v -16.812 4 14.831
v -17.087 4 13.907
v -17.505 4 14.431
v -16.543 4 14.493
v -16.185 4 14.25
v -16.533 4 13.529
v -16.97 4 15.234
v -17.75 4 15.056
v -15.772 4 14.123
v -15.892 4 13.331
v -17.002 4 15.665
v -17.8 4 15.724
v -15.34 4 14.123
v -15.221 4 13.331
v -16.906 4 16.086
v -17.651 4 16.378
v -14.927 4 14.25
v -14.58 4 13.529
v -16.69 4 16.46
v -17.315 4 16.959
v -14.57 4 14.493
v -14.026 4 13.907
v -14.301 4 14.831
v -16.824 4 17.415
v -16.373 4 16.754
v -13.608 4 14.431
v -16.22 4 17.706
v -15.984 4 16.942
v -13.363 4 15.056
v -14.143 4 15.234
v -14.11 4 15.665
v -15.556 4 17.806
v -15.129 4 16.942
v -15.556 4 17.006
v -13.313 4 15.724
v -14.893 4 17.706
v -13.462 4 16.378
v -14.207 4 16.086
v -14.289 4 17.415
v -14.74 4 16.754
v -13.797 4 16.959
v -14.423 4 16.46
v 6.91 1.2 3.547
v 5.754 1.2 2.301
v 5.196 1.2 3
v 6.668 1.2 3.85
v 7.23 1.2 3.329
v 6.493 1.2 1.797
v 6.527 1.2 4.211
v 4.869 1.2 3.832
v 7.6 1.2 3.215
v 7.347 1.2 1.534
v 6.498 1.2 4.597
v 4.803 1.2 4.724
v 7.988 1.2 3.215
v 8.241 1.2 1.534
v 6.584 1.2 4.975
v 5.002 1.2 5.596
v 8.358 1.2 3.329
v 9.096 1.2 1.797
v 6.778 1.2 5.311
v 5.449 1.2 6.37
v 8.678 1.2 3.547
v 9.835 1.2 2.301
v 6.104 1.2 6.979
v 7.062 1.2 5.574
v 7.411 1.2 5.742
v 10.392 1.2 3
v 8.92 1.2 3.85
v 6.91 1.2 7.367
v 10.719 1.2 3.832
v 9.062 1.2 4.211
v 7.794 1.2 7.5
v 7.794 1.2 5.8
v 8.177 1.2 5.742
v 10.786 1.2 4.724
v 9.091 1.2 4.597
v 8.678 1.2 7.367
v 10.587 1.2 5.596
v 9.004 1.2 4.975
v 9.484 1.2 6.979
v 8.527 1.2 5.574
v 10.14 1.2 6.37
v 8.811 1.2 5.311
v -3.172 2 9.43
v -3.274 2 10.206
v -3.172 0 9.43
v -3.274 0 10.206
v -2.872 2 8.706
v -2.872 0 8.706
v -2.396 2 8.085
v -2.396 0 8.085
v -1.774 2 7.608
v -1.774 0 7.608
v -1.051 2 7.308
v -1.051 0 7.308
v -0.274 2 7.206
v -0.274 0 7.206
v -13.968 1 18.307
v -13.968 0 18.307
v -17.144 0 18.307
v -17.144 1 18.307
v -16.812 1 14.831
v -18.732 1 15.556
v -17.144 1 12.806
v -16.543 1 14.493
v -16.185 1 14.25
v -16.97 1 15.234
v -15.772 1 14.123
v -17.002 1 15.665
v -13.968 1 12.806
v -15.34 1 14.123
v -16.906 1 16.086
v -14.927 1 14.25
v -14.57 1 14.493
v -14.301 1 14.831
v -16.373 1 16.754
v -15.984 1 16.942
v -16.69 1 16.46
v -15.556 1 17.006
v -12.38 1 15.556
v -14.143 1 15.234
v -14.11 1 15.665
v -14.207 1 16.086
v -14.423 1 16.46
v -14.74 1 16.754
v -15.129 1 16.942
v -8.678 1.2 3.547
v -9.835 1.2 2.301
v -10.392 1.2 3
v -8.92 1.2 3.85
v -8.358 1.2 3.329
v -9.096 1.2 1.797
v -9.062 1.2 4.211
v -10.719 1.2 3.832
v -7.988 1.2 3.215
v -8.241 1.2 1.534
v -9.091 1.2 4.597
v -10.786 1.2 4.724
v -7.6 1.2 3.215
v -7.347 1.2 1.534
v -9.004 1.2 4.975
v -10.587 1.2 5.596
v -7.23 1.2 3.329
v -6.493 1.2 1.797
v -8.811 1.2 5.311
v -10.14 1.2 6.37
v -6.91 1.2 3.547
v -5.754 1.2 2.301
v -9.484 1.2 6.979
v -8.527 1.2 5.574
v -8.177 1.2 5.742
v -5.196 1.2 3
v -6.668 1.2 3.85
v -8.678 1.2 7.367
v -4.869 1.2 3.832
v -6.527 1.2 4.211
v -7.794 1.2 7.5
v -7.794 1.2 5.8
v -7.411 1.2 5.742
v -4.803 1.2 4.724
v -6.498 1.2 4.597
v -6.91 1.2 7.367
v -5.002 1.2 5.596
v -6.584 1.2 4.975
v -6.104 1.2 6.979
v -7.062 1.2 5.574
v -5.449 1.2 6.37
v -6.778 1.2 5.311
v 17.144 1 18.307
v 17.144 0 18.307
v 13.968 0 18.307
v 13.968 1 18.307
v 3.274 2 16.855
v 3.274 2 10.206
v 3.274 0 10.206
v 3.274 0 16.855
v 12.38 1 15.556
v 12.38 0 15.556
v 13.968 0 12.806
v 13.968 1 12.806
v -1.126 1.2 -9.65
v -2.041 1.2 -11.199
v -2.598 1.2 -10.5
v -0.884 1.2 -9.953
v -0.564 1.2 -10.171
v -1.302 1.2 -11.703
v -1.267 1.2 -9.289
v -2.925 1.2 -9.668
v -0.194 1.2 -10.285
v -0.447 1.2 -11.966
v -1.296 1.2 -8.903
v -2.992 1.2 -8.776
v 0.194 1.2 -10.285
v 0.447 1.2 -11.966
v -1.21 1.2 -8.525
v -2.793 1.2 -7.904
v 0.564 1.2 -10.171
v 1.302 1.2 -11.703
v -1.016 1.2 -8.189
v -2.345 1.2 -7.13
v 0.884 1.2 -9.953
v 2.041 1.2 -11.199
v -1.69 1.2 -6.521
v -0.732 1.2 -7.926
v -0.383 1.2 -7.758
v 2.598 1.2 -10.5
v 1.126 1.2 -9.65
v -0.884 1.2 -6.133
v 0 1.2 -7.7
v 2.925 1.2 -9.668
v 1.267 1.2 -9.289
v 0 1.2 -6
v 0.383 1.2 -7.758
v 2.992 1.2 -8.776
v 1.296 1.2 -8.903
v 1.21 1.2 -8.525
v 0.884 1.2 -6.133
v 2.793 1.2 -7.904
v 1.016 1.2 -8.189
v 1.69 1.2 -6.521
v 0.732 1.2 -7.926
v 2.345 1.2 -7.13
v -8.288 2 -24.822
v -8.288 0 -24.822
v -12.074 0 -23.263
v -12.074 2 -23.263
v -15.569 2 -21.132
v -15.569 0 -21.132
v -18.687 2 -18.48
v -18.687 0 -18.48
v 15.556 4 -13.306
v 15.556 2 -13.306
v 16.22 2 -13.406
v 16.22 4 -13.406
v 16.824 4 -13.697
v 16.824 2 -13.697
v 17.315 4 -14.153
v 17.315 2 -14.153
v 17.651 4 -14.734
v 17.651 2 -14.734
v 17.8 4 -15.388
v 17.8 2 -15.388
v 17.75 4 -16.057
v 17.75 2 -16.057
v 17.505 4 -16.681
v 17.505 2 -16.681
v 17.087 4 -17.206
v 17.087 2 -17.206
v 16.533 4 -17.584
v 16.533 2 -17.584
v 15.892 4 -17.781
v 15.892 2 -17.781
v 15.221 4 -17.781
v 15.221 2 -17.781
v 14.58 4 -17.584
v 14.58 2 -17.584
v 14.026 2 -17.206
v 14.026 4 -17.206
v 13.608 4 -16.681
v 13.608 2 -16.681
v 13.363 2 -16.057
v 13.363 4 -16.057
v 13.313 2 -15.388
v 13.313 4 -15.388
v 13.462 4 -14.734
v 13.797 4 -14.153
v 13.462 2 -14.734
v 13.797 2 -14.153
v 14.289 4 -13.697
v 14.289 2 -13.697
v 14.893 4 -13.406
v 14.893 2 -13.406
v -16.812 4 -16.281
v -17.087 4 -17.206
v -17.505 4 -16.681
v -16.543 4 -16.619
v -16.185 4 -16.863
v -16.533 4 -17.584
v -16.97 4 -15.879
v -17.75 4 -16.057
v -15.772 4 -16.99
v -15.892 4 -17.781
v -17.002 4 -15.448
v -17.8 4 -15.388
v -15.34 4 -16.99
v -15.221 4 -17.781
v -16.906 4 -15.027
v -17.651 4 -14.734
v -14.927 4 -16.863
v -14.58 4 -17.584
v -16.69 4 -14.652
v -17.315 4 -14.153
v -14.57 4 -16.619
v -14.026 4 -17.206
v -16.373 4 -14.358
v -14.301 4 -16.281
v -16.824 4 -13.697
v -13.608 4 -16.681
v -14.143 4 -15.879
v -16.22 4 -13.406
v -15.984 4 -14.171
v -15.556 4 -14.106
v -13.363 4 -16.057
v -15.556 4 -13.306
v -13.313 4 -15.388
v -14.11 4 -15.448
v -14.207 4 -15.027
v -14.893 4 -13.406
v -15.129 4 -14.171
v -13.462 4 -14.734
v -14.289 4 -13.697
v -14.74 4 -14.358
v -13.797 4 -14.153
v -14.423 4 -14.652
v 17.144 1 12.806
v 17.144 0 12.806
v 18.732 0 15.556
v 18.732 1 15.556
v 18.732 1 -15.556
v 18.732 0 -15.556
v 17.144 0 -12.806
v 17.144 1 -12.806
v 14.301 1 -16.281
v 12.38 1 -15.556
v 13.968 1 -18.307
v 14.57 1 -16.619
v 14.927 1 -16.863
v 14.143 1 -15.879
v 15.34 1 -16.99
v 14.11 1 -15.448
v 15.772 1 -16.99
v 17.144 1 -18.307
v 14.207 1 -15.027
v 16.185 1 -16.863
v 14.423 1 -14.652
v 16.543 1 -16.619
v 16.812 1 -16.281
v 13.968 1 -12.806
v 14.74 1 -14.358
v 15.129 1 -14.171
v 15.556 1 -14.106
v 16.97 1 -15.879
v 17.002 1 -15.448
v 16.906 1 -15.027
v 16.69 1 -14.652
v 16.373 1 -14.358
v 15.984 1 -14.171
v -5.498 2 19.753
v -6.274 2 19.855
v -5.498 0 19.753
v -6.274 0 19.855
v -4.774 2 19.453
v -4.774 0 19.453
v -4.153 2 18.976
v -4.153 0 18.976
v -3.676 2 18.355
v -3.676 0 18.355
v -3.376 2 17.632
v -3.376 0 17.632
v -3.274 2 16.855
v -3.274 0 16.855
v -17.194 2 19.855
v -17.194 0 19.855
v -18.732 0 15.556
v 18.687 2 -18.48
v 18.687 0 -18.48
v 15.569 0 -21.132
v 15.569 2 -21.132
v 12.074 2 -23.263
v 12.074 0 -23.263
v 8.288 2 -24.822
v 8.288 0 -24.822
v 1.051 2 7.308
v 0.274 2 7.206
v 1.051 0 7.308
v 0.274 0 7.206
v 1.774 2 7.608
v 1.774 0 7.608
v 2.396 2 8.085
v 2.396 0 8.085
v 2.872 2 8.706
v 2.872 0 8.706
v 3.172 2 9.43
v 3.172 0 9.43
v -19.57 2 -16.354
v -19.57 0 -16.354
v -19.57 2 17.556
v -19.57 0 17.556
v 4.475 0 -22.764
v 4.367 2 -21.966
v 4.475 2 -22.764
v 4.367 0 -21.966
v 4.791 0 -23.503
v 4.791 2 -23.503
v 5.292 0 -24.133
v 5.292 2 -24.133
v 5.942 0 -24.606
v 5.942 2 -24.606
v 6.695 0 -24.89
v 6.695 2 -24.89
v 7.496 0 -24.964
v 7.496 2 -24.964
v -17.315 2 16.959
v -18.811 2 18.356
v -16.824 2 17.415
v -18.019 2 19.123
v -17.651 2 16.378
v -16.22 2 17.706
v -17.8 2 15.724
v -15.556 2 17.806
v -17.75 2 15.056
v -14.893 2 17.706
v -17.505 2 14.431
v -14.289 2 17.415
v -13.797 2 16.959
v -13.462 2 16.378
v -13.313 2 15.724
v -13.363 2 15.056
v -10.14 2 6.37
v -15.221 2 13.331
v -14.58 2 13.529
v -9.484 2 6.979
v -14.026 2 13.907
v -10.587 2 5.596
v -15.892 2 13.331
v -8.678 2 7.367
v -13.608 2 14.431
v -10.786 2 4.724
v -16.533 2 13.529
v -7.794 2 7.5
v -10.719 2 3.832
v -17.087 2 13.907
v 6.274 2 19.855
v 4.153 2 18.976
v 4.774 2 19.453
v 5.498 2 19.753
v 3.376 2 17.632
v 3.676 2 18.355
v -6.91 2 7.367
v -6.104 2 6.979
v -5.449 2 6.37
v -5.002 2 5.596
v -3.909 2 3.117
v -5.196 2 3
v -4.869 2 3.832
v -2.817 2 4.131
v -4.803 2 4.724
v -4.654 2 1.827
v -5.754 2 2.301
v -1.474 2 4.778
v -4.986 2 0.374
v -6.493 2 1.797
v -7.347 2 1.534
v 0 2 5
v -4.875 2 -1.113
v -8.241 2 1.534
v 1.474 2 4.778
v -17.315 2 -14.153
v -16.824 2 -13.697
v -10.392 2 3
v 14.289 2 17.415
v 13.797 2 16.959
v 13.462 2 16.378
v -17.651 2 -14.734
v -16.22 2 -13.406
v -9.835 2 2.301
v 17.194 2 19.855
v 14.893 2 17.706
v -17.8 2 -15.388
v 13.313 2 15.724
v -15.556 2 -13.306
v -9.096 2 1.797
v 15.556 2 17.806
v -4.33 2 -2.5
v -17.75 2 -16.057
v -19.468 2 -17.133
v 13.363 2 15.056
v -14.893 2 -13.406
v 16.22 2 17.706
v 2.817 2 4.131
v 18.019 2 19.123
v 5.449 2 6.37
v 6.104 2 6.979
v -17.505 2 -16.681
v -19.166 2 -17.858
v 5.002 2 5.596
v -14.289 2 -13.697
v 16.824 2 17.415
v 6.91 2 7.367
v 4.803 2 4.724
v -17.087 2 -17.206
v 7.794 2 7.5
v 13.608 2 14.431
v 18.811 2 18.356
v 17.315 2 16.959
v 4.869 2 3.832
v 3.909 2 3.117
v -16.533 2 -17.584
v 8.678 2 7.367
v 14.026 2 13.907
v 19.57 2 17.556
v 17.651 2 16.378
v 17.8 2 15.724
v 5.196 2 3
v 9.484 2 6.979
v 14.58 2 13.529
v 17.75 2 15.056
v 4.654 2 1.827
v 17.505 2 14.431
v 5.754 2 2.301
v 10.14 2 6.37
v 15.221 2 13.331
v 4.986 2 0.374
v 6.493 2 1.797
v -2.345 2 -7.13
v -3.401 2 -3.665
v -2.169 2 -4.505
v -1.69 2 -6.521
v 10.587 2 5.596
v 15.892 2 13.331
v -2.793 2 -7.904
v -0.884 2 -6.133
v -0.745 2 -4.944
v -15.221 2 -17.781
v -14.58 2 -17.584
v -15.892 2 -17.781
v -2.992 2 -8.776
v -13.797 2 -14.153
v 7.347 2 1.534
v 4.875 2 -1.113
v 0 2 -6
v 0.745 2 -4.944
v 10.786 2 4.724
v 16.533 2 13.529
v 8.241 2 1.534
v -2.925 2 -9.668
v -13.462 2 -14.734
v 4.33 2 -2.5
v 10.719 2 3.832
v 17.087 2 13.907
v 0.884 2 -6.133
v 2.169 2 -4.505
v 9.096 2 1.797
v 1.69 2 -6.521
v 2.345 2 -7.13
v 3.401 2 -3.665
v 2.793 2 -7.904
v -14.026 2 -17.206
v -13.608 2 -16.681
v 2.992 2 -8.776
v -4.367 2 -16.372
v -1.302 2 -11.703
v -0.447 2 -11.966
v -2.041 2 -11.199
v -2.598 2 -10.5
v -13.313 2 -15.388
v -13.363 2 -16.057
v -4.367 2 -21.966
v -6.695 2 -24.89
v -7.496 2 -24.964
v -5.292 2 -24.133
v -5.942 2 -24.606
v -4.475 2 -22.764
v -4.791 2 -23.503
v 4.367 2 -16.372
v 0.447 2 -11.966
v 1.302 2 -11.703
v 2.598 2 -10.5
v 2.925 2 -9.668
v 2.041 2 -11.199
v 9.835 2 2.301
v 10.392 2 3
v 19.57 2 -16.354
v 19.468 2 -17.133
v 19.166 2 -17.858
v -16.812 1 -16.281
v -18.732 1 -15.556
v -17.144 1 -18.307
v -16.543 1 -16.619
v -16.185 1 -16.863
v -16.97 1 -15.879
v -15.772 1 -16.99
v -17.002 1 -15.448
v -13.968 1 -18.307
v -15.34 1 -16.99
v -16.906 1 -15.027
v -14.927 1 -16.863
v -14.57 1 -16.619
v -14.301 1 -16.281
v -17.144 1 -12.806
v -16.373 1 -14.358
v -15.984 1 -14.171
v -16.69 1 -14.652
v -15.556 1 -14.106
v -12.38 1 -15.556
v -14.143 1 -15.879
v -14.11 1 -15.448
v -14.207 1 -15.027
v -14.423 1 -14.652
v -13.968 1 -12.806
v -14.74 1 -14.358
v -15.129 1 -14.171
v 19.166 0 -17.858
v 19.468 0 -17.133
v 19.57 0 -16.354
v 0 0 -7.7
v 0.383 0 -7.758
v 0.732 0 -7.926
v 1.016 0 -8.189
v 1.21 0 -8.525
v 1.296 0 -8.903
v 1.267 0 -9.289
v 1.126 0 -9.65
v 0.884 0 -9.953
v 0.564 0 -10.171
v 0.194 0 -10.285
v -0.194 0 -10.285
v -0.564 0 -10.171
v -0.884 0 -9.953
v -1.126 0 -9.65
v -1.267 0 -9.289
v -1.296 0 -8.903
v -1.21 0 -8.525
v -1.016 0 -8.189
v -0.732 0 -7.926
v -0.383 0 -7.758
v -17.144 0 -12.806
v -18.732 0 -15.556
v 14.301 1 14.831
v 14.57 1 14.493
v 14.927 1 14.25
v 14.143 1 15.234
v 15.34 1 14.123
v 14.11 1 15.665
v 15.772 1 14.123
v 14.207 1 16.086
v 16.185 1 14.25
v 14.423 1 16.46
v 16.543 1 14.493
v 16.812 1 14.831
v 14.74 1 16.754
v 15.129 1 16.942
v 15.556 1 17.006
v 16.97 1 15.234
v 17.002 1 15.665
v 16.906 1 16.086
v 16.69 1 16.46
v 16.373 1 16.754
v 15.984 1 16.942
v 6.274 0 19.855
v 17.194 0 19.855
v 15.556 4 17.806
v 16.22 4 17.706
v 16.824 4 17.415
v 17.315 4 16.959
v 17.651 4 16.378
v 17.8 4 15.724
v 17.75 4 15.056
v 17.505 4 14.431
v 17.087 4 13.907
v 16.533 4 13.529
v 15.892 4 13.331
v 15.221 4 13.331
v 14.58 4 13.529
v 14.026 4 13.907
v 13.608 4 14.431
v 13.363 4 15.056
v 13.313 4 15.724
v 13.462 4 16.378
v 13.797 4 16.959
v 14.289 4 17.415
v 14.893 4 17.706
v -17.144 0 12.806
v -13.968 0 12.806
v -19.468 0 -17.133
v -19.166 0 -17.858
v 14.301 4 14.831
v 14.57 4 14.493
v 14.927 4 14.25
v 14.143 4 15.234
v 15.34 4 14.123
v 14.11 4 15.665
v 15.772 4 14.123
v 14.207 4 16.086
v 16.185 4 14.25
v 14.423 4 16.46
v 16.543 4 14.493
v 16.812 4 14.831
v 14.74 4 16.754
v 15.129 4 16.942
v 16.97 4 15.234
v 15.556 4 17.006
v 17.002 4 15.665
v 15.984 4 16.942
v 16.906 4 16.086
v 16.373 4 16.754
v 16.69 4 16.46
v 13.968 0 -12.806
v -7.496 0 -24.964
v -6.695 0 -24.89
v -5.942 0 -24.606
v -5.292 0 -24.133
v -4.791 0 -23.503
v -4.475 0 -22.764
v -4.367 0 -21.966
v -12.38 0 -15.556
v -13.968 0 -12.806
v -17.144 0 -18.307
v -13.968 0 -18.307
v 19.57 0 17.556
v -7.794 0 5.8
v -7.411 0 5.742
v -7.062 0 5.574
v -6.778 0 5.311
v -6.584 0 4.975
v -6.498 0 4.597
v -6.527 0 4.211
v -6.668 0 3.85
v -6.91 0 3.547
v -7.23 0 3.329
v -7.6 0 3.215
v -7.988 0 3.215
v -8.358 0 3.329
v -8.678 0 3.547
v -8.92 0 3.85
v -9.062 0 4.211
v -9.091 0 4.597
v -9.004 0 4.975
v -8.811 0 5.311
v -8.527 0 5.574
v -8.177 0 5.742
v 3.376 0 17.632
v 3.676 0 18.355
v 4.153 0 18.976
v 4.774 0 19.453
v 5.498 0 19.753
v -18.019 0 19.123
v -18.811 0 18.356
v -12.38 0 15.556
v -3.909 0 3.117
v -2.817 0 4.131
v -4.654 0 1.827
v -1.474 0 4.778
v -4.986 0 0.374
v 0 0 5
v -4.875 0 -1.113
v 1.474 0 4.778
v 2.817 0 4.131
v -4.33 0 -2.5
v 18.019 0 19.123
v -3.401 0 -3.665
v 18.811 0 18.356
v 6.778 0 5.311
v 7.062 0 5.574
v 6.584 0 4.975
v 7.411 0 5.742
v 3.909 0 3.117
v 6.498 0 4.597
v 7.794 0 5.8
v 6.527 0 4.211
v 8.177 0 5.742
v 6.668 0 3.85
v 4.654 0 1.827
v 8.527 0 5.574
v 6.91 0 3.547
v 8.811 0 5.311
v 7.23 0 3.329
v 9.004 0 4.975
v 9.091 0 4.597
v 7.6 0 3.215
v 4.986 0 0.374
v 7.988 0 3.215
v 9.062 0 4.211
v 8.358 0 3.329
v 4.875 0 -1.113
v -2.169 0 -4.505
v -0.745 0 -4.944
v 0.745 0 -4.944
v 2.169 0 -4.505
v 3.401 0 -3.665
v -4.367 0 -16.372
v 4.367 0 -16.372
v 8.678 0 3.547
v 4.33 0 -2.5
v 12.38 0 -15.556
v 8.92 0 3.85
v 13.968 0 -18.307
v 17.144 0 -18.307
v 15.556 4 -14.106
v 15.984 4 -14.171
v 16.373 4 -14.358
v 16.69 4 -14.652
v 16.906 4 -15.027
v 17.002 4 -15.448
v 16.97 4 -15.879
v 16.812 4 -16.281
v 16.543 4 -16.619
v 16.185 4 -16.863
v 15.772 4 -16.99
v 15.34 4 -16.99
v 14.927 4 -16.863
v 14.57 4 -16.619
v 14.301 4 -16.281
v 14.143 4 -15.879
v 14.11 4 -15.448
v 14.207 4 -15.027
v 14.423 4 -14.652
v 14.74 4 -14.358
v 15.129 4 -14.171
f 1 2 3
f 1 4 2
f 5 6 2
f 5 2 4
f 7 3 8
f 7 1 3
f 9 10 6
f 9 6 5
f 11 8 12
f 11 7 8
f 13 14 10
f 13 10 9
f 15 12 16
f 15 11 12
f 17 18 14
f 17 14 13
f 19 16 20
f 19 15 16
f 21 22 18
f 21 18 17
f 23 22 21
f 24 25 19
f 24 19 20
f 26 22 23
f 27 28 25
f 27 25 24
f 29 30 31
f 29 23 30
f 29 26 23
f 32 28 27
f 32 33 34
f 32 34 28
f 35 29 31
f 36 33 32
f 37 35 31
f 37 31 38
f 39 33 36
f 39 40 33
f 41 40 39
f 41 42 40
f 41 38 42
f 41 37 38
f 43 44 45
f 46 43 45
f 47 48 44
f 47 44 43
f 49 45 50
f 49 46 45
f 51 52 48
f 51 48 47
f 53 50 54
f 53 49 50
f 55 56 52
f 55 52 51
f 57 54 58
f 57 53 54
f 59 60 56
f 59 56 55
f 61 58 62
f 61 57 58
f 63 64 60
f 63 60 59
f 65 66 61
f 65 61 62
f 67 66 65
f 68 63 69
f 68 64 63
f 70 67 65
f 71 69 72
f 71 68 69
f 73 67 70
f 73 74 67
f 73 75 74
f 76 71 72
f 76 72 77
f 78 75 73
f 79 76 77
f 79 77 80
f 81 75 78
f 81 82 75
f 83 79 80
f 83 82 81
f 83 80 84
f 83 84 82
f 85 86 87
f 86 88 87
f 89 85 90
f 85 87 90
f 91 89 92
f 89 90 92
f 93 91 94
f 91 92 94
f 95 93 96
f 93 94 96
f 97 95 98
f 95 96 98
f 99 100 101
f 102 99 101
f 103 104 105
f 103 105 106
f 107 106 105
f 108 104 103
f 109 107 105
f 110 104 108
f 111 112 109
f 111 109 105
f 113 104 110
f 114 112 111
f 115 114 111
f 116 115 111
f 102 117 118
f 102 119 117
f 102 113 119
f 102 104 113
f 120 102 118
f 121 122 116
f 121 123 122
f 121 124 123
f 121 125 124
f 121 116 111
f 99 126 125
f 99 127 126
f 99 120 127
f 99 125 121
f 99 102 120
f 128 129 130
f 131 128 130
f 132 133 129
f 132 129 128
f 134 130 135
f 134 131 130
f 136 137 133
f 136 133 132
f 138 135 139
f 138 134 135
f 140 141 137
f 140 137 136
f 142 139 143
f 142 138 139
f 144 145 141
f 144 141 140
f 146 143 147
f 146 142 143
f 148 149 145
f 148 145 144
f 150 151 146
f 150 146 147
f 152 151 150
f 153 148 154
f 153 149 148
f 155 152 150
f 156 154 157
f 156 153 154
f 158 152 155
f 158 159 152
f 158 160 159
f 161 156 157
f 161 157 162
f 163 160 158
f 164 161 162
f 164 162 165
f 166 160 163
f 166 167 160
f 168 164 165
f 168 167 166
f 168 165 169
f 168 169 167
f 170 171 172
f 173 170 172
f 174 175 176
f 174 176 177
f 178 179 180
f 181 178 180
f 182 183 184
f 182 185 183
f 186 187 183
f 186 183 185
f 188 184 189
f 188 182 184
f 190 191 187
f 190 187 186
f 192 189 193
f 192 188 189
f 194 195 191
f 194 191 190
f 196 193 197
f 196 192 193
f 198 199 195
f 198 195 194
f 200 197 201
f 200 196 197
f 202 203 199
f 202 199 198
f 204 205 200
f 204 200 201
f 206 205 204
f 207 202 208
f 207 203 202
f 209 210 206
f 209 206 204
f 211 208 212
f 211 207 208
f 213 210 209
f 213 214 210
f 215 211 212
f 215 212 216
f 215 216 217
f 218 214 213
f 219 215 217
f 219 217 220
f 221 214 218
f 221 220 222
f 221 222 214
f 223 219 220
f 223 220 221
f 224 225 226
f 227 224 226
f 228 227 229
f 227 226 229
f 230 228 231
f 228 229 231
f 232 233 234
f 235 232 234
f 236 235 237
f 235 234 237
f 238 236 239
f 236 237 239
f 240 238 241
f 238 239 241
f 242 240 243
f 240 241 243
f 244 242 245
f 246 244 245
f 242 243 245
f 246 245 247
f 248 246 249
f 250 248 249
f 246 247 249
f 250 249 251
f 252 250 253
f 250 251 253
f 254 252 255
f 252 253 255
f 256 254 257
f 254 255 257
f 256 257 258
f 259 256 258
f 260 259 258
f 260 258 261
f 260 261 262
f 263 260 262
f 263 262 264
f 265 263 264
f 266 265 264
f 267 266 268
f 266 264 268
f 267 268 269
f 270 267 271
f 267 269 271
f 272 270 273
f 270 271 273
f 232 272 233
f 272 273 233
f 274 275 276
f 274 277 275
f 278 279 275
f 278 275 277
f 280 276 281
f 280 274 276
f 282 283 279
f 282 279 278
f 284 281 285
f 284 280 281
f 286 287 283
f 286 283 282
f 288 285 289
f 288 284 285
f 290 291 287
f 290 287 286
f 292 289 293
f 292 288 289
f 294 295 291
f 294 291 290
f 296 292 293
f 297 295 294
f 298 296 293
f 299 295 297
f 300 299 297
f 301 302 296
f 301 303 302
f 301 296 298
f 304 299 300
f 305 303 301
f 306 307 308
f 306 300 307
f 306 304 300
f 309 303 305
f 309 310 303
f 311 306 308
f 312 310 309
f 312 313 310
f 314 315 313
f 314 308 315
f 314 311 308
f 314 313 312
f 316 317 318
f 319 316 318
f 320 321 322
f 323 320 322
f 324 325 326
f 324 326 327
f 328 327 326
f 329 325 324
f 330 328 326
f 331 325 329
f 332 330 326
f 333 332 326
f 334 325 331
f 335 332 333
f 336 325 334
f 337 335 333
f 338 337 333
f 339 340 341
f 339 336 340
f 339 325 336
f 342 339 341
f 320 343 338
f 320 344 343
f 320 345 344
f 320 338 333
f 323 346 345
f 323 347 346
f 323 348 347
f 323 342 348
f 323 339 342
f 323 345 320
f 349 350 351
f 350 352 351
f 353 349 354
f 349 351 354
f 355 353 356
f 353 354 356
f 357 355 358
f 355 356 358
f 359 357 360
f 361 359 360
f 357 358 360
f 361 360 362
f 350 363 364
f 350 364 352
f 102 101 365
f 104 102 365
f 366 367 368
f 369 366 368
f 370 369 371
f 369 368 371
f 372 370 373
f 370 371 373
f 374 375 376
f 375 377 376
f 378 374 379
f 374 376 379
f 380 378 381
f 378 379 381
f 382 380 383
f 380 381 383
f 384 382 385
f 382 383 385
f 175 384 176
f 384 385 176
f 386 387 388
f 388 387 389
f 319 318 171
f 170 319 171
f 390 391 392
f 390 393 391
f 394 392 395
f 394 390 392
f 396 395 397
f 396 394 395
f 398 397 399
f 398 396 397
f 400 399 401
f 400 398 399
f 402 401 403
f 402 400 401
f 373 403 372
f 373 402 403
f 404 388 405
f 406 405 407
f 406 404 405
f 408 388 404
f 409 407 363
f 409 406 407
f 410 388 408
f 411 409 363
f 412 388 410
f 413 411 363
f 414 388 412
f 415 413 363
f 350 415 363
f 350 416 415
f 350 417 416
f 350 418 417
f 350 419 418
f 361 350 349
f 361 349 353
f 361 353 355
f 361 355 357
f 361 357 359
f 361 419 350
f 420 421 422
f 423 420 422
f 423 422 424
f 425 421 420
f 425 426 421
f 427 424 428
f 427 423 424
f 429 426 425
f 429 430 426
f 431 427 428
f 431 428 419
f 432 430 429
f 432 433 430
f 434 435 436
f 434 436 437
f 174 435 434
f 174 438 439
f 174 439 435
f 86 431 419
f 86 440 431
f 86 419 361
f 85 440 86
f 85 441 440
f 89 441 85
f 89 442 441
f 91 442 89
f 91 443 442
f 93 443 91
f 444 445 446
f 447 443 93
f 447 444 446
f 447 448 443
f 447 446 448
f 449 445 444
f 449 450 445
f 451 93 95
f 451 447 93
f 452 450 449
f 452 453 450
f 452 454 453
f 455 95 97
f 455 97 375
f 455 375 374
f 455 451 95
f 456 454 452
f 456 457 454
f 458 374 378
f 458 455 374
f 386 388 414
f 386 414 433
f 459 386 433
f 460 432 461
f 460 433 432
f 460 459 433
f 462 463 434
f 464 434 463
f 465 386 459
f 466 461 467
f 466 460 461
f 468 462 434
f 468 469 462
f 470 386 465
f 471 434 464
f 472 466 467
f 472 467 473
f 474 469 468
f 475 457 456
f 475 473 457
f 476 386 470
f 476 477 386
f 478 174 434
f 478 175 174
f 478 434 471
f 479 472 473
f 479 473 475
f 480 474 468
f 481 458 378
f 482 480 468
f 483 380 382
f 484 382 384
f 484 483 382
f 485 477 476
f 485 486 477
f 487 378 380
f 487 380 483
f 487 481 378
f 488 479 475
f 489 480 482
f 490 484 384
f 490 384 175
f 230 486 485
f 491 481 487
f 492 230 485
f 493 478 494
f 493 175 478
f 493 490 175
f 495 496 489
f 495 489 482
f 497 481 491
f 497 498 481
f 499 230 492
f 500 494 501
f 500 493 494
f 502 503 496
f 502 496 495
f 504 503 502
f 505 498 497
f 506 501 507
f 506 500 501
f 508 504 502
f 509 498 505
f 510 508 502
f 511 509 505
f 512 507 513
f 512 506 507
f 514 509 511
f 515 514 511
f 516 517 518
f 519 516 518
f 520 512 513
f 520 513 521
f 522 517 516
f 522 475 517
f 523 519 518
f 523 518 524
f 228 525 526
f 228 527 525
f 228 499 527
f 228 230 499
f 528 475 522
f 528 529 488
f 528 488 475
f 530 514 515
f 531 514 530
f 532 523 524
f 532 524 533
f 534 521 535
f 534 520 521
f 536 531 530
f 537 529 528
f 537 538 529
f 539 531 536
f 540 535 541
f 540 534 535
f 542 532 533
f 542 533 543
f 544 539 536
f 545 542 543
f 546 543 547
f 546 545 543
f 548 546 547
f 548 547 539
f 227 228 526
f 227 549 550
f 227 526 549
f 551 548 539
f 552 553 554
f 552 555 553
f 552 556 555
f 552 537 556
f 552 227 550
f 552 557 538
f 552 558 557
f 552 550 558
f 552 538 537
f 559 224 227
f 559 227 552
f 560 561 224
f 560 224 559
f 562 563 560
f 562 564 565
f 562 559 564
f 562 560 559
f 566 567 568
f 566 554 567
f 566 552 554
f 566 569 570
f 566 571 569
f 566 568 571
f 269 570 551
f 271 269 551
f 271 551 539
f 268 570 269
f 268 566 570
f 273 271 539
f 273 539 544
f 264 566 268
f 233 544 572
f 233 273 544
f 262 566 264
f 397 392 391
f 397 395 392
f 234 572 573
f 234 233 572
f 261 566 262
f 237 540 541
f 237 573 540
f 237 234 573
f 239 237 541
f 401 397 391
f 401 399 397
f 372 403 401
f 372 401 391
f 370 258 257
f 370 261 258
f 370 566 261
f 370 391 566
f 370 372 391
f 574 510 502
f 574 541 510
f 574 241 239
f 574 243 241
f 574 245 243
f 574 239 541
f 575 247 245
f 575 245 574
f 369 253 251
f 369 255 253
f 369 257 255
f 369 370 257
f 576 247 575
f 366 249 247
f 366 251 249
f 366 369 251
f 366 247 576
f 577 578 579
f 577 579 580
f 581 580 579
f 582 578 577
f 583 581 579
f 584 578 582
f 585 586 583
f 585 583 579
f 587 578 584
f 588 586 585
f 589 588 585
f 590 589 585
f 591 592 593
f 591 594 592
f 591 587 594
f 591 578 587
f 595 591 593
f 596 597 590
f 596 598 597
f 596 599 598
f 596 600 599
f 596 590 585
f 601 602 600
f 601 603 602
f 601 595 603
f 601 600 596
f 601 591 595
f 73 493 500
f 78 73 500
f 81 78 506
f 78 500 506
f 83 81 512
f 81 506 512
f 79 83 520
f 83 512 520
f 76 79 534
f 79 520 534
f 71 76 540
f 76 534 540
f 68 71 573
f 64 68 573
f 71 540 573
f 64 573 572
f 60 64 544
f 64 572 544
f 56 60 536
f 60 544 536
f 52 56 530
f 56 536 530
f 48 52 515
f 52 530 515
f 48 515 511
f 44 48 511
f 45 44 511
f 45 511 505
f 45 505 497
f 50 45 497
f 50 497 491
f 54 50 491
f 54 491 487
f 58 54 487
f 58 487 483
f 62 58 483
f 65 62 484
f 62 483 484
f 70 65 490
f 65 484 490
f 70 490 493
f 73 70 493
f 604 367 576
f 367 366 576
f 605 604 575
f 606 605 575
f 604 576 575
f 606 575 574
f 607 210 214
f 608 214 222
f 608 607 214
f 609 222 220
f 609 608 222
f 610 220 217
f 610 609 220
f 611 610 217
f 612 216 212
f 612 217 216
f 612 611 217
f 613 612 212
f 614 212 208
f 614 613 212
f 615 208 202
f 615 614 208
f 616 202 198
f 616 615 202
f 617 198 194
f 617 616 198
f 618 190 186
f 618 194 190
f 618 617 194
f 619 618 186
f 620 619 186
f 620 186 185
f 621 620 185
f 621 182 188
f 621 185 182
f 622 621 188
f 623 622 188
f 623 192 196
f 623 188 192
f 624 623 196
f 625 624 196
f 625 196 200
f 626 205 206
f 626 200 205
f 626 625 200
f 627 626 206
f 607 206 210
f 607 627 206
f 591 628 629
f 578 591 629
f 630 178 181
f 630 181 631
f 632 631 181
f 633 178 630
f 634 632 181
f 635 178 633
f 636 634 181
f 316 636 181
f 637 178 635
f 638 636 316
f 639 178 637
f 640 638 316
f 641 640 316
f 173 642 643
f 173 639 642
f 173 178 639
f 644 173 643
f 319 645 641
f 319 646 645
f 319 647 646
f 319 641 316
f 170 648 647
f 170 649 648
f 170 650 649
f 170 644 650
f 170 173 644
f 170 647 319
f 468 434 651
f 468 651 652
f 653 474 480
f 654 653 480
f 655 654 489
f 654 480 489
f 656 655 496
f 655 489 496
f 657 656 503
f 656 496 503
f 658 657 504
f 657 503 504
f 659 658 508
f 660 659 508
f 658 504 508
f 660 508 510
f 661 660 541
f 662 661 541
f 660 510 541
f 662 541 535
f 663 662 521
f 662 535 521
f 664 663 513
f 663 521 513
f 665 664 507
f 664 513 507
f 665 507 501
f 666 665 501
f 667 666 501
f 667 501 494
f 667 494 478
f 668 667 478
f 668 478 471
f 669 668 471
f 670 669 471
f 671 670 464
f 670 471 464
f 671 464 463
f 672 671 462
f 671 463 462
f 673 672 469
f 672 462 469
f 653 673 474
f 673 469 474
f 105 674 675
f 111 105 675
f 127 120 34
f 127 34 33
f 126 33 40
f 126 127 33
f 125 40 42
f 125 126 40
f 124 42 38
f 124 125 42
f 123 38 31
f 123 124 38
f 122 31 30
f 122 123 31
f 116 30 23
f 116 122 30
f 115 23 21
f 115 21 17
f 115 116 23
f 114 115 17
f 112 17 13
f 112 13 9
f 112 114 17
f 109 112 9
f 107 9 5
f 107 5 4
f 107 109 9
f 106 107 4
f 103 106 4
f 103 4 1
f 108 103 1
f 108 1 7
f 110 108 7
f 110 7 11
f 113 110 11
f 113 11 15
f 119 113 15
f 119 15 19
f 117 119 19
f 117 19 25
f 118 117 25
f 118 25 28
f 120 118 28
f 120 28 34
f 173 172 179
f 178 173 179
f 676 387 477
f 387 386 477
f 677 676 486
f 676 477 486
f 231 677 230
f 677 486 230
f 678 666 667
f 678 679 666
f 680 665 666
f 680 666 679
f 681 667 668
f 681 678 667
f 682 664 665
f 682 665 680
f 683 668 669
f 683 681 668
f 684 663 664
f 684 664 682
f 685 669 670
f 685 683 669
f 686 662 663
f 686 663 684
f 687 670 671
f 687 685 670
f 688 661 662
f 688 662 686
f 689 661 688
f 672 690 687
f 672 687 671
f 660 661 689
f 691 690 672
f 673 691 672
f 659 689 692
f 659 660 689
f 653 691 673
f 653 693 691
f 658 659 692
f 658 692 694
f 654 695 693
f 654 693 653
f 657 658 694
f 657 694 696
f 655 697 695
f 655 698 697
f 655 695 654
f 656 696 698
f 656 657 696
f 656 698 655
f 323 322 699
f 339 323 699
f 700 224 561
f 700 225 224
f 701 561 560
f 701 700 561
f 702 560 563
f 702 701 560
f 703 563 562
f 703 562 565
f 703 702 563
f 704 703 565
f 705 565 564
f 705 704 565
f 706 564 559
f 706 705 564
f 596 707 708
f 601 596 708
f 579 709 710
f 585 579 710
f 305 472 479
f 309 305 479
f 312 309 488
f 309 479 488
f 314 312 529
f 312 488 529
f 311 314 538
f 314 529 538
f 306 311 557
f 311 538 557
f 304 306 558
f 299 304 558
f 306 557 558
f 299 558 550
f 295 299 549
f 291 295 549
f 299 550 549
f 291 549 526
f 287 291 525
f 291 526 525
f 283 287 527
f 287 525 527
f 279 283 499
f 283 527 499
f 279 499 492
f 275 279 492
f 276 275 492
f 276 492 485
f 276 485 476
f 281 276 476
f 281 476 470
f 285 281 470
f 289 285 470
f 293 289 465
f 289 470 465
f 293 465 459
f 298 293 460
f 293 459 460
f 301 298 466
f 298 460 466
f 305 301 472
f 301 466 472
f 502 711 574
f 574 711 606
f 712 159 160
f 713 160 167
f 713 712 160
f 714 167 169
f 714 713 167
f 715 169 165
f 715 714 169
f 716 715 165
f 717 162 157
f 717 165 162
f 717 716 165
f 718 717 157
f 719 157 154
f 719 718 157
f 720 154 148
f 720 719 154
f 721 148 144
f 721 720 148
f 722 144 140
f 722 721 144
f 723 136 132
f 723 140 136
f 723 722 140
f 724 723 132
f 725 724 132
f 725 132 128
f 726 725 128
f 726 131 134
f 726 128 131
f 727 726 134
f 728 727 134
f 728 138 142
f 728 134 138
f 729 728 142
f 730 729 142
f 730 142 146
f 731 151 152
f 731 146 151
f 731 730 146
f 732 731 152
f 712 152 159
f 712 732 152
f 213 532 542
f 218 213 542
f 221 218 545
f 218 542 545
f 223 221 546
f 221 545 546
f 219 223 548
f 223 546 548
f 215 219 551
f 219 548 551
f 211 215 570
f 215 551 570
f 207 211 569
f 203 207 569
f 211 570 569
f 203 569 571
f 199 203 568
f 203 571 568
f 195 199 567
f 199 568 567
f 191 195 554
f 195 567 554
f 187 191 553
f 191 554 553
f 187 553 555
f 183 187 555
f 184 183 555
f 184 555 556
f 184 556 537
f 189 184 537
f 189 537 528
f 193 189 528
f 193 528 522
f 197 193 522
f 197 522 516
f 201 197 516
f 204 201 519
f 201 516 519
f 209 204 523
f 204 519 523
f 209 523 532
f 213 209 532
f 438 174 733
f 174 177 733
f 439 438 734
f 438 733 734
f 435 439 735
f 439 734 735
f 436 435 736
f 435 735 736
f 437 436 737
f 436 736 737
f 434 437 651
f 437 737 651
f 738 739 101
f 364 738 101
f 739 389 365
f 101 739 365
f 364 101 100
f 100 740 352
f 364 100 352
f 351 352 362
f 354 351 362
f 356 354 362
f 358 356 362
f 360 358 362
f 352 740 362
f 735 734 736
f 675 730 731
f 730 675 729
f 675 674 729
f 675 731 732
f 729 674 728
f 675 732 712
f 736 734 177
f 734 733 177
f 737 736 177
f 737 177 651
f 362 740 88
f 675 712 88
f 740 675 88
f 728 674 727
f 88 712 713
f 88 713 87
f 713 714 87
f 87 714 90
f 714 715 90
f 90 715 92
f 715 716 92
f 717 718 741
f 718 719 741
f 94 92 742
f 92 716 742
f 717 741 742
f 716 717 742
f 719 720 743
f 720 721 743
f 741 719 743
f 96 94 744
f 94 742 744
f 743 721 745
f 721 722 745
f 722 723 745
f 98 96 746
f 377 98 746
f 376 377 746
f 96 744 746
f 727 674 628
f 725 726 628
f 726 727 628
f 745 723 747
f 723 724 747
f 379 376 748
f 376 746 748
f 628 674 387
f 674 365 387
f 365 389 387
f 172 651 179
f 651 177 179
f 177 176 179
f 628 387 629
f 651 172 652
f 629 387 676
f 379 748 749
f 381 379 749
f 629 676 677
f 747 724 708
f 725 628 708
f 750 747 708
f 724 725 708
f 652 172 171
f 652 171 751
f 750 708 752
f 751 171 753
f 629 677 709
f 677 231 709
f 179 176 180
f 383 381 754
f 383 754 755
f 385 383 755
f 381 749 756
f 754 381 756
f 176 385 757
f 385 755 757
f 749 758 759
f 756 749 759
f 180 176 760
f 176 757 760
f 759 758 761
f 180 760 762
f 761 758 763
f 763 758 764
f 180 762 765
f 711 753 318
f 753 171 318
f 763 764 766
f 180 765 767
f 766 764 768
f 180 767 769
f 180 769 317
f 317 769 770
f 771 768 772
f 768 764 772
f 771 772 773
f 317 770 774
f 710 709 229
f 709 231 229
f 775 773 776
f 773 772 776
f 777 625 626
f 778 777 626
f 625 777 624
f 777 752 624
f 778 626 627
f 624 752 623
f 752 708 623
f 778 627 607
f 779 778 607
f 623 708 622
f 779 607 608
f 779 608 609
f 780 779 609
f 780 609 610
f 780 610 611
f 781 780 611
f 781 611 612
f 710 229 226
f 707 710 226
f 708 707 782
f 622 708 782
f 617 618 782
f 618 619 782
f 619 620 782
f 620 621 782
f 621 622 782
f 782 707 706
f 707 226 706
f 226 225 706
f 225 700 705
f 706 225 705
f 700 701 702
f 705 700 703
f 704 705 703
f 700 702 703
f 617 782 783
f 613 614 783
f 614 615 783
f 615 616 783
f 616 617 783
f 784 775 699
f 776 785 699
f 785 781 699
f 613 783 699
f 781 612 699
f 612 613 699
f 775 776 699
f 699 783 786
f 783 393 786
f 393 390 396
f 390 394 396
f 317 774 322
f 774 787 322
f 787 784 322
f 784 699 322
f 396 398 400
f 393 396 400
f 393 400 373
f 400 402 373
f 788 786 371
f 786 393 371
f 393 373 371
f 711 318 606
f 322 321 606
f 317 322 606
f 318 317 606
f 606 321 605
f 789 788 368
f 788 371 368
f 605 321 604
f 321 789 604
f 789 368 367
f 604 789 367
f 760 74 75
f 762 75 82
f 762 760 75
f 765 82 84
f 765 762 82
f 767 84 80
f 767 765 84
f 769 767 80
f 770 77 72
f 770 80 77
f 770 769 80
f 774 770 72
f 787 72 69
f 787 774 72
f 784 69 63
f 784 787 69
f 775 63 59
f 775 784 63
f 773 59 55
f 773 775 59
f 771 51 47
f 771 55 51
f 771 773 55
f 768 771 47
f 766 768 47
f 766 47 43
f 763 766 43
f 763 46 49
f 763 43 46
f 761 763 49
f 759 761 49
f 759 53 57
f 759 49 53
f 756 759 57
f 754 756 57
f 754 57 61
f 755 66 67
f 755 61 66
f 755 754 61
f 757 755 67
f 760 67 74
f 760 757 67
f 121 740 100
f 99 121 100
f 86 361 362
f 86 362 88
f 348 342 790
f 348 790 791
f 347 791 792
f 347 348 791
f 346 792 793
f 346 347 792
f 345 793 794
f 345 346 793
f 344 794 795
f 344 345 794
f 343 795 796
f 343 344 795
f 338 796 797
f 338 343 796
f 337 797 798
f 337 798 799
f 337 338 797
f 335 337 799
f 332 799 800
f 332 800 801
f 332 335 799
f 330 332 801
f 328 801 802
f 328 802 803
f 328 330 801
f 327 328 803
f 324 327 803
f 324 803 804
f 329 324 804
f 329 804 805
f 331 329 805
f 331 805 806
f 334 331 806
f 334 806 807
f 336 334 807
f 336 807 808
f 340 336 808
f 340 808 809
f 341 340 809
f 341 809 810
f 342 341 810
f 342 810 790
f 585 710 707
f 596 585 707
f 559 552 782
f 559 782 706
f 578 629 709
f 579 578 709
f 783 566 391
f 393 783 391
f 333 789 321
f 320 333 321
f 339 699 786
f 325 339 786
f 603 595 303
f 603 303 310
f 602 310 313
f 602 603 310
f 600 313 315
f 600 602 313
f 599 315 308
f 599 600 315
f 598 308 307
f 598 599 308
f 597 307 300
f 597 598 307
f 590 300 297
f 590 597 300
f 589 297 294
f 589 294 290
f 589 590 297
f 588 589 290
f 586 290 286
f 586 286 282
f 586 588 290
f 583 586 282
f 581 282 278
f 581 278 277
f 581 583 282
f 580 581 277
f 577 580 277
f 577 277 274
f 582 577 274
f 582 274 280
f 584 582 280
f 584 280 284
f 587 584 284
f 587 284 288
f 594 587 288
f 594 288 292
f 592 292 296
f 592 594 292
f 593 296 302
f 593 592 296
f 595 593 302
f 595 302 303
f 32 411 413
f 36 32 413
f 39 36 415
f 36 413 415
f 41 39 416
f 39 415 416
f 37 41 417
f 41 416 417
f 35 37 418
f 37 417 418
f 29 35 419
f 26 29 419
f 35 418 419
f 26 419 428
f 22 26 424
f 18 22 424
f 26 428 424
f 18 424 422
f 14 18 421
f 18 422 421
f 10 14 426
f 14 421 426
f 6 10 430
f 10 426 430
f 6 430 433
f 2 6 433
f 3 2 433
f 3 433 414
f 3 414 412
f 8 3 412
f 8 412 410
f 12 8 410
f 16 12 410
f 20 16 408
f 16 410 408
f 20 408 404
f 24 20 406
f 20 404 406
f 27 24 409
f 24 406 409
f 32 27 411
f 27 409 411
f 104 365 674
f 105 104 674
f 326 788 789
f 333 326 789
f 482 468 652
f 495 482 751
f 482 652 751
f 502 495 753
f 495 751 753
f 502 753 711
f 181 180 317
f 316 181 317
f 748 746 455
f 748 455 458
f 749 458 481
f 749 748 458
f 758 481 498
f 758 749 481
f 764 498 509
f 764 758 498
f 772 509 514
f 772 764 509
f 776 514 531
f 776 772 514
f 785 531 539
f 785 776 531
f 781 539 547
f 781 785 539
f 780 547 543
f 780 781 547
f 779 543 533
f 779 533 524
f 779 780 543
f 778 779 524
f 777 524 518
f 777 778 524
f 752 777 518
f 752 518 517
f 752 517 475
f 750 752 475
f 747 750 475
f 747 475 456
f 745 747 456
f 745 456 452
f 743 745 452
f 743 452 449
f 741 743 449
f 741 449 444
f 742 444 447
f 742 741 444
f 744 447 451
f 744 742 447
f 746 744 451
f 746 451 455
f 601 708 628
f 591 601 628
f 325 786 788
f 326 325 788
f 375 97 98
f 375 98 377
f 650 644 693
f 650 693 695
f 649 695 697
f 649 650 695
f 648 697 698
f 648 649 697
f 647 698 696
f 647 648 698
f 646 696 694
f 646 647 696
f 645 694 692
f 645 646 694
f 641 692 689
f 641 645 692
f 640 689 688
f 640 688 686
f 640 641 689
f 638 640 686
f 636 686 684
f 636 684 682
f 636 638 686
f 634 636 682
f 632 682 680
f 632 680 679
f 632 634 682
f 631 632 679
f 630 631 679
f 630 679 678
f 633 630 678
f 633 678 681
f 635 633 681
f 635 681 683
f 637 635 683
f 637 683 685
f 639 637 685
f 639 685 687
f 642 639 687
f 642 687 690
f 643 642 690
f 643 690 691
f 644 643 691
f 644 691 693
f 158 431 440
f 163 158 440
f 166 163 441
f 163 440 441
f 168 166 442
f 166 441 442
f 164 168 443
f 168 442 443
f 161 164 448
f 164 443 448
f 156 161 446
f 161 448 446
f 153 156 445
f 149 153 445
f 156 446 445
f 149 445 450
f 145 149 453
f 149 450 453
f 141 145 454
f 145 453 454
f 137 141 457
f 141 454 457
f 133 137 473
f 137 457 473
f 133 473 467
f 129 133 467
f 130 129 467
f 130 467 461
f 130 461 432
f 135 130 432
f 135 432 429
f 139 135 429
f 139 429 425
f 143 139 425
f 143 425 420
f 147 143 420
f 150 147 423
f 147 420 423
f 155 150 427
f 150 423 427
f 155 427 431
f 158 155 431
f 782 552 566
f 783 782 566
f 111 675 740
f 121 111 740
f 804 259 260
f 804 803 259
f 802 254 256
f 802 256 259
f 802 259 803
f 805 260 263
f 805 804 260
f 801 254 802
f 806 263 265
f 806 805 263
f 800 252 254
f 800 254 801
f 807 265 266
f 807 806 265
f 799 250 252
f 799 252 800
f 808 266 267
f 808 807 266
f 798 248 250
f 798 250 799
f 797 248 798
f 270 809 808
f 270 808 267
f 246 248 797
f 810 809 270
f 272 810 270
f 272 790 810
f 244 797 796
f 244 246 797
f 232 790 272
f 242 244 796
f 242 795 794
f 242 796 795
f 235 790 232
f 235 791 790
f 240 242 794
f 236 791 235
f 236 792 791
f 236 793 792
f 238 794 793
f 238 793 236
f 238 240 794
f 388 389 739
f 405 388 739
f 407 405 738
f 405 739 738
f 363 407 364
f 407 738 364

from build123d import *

# Parameters (mm, degrees)
SKETCH_1_R          = 1.3
SKETCH_1_R_2        = 5
SKETCH_1_R_3        = 1.45
EXTRUDE_1_DEPTH     = 2
SKETCH_2_R          = 3
CUT_EXTRUDE_1_DEPTH = 0.8
SKETCH_4_W          = 8.73447759
SKETCH_4_H          = 10.120774017
CUT_EXTRUDE_2_DEPTH = 33.667542419
SKETCH_8_R          = 2.25
SKETCH_8_R_2        = 1.45
EXTRUDE_2_DEPTH     = 2
CUT_EXTRUDE_4_DEPTH = 1
FILLET_3_R          = 3


with BuildPart() as part:
    # 草图1 → 凸台-拉伸1 (new body)
    with BuildSketch(Plane(origin=(0, 0, 0), x_dir=(1, 0, 0), z_dir=(0, 1, 0))):
        with BuildLine():
            Line((-19.570385791, 15.556349186), (-19.570385791, -15.556349186))
            Line((-19.570385791, -15.556349186), (-19.570385791, -17.556349186))
            ThreePointArc((-19.570385791, -17.556349186), (-10.696991496, -23.91128764), (0, -26.07848445))
            ThreePointArc((0, -26.07848445), (10.696991496, -23.91128764), (19.570385791, -17.556349186))
            Line((19.570385791, -17.556349186), (19.570385791, -15.556349186))
            Line((19.570385791, -15.556349186), (19.570385791, 15.556349186))
            Line((19.570385791, 15.556349186), (19.570385791, 17.556349186))
            ThreePointArc((19.570385791, 17.556349186), (10.696991496, 23.91128764), (0, 26.07848445))
            ThreePointArc((0, 26.07848445), (-10.696991496, 23.91128764), (-19.570385791, 17.556349186))
            Line((-19.570385791, 17.556349186), (-19.570385791, 15.556349186))
        make_face()
        with Locations(Location((0, 9, 0), (0, 0, 270))):
            Circle(SKETCH_1_R, mode=Mode.SUBTRACT)
        with Locations(Location((7.794228634, -4.5, 0), (0, 0, 270))):
            Circle(SKETCH_1_R, mode=Mode.SUBTRACT)
        with Locations(Location((-7.794228634, -4.5, 0), (0, 0, 270))):
            Circle(SKETCH_1_R, mode=Mode.SUBTRACT)
        with Locations(Location((0, 0, 0), (0, 0, 270))):
            Circle(SKETCH_1_R_2, mode=Mode.SUBTRACT)
        with Locations(Location((-15.556349186, 15.556349186, 0), (0, 0, 270))):
            Circle(SKETCH_1_R_3, mode=Mode.SUBTRACT)
        with Locations(Location((15.556349186, 15.556349186, 0), (0, 0, 270))):
            Circle(SKETCH_1_R_3, mode=Mode.SUBTRACT)
        with Locations(Location((15.556349186, -15.556349186, 0), (0, 0, 270))):
            Circle(SKETCH_1_R_3, mode=Mode.SUBTRACT)
        with Locations(Location((-15.556349186, -15.556349186, 0), (0, 0, 270))):
            Circle(SKETCH_1_R_3, mode=Mode.SUBTRACT)
    extrude(amount=EXTRUDE_1_DEPTH)

    # 草图2 → 切除-拉伸1 (cut)
    with BuildSketch(Plane(origin=(0, 2, 0), x_dir=(1, 0, 0), z_dir=(0, 1, 0))):
        with Locations(Location((0, 9, 0), (0, 0, 270))):
            Circle(SKETCH_2_R)
        with Locations(Location((7.794228634, -4.5, 0), (0, 0, 270))):
            Circle(SKETCH_2_R)
        with Locations(Location((-7.794228634, -4.5, 0), (0, 0, 270))):
            Circle(SKETCH_2_R)
    extrude(amount=-CUT_EXTRUDE_1_DEPTH, mode=Mode.SUBTRACT)

    # 草图4 → 切除-拉伸2 (cut, through all)
    with BuildSketch(Plane(origin=(0, 2, 0), x_dir=(1, 0, 0), z_dir=(0, 1, 0))):
        Polygon((-3.274193367, -19.855122702), (-3.274193367, -7.205990029), (3.274193367, -7.205990029), (3.274193367, -19.855122702), (19.611727687, -19.855122702), (19.611727687, -26.506793376), (-19.611727687, -26.506793376), (-19.611727687, -19.855122702), align=None)
        with Locations((0, 21.431925769)):
            Rectangle(SKETCH_4_W, SKETCH_4_H)
    extrude(amount=-CUT_EXTRUDE_2_DEPTH, mode=Mode.SUBTRACT)

    # 草图8 → 凸台-拉伸2 (add)
    # profile 1 of 4: a face of its own
    with BuildSketch(Plane(origin=(0, 2, 0), x_dir=(1, 0, 0), z_dir=(0, 1, 0))):
        with Locations(Location((-15.556349186, 15.556349186, 0), (0, 0, 270))):
            Circle(SKETCH_8_R)
        with Locations(Location((-15.556349186, 15.556349186, 0), (0, 0, 270))):
            Circle(SKETCH_8_R_2, mode=Mode.SUBTRACT)
    # profile 2 of 4: a face of its own
    with BuildSketch(Plane(origin=(0, 2, 0), x_dir=(1, 0, 0), z_dir=(0, 1, 0))):
        with Locations(Location((15.556349186, 15.556349186, 0), (0, 0, 270))):
            Circle(SKETCH_8_R)
        with Locations(Location((15.556349186, 15.556349186, 0), (0, 0, 270))):
            Circle(SKETCH_8_R_2, mode=Mode.SUBTRACT)
    # profile 3 of 4: a face of its own
    with BuildSketch(Plane(origin=(0, 2, 0), x_dir=(1, 0, 0), z_dir=(0, 1, 0))):
        with Locations(Location((15.556349186, -15.556349186, 0), (0, 0, 270))):
            Circle(SKETCH_8_R)
        with Locations(Location((15.556349186, -15.556349186, 0), (0, 0, 270))):
            Circle(SKETCH_8_R_2, mode=Mode.SUBTRACT)
    # profile 4 of 4: a face of its own
    with BuildSketch(Plane(origin=(0, 2, 0), x_dir=(1, 0, 0), z_dir=(0, 1, 0))):
        with Locations(Location((-15.556349186, -15.556349186, 0), (0, 0, 270))):
            Circle(SKETCH_8_R)
        with Locations(Location((-15.556349186, -15.556349186, 0), (0, 0, 270))):
            Circle(SKETCH_8_R_2, mode=Mode.SUBTRACT)
    extrude(amount=EXTRUDE_2_DEPTH)

    # 草图7 → 切除-拉伸4 (cut)
    with BuildSketch(Plane.XZ):
        Polygon((-18.732353017, 15.556349186), (-17.144351102, 12.805849186), (-13.968347271, 12.805849186), (-12.380345355, 15.556349186), (-13.968347271, 18.306849186), (-17.144351102, 18.306849186), align=None)
        Polygon((12.380345355, 15.556349186), (13.968347271, 12.805849186), (17.144351102, 12.805849186), (18.732353017, 15.556349186), (17.144351102, 18.306849186), (13.968347271, 18.306849186), align=None)
        Polygon((-18.732353017, -15.556349186), (-17.144351102, -18.306849186), (-13.968347271, -18.306849186), (-12.380345355, -15.556349186), (-13.968347271, -12.805849186), (-17.144351102, -12.805849186), align=None)
        Polygon((12.380345355, -15.556349186), (13.968347271, -18.306849186), (17.144351102, -18.306849186), (18.732353017, -15.556349186), (17.144351102, -12.805849186), (13.968347271, -12.805849186), align=None)
    extrude(amount=-CUT_EXTRUDE_4_DEPTH, mode=Mode.SUBTRACT)

    # 圆角3
    fillet_3_edges = [part.edges().sort_by_distance(p)[0] for p in [
        (3.274193367, 1, 19.855122702),
        (-3.274193367, 1, 7.205990029),
        (3.274193367, 1, 7.205990029),
        (-3.274193367, 1, 19.855122702),
        (19.570385791, 1, -17.556349186),
        (-19.570385791, 1, -17.556349186),
        (-4.367238795, 1, -25.758495538),
        (4.367238795, 1, -25.758495538),
    ]]
    fillet(fillet_3_edges, radius=FILLET_3_R)


solid = part.part
